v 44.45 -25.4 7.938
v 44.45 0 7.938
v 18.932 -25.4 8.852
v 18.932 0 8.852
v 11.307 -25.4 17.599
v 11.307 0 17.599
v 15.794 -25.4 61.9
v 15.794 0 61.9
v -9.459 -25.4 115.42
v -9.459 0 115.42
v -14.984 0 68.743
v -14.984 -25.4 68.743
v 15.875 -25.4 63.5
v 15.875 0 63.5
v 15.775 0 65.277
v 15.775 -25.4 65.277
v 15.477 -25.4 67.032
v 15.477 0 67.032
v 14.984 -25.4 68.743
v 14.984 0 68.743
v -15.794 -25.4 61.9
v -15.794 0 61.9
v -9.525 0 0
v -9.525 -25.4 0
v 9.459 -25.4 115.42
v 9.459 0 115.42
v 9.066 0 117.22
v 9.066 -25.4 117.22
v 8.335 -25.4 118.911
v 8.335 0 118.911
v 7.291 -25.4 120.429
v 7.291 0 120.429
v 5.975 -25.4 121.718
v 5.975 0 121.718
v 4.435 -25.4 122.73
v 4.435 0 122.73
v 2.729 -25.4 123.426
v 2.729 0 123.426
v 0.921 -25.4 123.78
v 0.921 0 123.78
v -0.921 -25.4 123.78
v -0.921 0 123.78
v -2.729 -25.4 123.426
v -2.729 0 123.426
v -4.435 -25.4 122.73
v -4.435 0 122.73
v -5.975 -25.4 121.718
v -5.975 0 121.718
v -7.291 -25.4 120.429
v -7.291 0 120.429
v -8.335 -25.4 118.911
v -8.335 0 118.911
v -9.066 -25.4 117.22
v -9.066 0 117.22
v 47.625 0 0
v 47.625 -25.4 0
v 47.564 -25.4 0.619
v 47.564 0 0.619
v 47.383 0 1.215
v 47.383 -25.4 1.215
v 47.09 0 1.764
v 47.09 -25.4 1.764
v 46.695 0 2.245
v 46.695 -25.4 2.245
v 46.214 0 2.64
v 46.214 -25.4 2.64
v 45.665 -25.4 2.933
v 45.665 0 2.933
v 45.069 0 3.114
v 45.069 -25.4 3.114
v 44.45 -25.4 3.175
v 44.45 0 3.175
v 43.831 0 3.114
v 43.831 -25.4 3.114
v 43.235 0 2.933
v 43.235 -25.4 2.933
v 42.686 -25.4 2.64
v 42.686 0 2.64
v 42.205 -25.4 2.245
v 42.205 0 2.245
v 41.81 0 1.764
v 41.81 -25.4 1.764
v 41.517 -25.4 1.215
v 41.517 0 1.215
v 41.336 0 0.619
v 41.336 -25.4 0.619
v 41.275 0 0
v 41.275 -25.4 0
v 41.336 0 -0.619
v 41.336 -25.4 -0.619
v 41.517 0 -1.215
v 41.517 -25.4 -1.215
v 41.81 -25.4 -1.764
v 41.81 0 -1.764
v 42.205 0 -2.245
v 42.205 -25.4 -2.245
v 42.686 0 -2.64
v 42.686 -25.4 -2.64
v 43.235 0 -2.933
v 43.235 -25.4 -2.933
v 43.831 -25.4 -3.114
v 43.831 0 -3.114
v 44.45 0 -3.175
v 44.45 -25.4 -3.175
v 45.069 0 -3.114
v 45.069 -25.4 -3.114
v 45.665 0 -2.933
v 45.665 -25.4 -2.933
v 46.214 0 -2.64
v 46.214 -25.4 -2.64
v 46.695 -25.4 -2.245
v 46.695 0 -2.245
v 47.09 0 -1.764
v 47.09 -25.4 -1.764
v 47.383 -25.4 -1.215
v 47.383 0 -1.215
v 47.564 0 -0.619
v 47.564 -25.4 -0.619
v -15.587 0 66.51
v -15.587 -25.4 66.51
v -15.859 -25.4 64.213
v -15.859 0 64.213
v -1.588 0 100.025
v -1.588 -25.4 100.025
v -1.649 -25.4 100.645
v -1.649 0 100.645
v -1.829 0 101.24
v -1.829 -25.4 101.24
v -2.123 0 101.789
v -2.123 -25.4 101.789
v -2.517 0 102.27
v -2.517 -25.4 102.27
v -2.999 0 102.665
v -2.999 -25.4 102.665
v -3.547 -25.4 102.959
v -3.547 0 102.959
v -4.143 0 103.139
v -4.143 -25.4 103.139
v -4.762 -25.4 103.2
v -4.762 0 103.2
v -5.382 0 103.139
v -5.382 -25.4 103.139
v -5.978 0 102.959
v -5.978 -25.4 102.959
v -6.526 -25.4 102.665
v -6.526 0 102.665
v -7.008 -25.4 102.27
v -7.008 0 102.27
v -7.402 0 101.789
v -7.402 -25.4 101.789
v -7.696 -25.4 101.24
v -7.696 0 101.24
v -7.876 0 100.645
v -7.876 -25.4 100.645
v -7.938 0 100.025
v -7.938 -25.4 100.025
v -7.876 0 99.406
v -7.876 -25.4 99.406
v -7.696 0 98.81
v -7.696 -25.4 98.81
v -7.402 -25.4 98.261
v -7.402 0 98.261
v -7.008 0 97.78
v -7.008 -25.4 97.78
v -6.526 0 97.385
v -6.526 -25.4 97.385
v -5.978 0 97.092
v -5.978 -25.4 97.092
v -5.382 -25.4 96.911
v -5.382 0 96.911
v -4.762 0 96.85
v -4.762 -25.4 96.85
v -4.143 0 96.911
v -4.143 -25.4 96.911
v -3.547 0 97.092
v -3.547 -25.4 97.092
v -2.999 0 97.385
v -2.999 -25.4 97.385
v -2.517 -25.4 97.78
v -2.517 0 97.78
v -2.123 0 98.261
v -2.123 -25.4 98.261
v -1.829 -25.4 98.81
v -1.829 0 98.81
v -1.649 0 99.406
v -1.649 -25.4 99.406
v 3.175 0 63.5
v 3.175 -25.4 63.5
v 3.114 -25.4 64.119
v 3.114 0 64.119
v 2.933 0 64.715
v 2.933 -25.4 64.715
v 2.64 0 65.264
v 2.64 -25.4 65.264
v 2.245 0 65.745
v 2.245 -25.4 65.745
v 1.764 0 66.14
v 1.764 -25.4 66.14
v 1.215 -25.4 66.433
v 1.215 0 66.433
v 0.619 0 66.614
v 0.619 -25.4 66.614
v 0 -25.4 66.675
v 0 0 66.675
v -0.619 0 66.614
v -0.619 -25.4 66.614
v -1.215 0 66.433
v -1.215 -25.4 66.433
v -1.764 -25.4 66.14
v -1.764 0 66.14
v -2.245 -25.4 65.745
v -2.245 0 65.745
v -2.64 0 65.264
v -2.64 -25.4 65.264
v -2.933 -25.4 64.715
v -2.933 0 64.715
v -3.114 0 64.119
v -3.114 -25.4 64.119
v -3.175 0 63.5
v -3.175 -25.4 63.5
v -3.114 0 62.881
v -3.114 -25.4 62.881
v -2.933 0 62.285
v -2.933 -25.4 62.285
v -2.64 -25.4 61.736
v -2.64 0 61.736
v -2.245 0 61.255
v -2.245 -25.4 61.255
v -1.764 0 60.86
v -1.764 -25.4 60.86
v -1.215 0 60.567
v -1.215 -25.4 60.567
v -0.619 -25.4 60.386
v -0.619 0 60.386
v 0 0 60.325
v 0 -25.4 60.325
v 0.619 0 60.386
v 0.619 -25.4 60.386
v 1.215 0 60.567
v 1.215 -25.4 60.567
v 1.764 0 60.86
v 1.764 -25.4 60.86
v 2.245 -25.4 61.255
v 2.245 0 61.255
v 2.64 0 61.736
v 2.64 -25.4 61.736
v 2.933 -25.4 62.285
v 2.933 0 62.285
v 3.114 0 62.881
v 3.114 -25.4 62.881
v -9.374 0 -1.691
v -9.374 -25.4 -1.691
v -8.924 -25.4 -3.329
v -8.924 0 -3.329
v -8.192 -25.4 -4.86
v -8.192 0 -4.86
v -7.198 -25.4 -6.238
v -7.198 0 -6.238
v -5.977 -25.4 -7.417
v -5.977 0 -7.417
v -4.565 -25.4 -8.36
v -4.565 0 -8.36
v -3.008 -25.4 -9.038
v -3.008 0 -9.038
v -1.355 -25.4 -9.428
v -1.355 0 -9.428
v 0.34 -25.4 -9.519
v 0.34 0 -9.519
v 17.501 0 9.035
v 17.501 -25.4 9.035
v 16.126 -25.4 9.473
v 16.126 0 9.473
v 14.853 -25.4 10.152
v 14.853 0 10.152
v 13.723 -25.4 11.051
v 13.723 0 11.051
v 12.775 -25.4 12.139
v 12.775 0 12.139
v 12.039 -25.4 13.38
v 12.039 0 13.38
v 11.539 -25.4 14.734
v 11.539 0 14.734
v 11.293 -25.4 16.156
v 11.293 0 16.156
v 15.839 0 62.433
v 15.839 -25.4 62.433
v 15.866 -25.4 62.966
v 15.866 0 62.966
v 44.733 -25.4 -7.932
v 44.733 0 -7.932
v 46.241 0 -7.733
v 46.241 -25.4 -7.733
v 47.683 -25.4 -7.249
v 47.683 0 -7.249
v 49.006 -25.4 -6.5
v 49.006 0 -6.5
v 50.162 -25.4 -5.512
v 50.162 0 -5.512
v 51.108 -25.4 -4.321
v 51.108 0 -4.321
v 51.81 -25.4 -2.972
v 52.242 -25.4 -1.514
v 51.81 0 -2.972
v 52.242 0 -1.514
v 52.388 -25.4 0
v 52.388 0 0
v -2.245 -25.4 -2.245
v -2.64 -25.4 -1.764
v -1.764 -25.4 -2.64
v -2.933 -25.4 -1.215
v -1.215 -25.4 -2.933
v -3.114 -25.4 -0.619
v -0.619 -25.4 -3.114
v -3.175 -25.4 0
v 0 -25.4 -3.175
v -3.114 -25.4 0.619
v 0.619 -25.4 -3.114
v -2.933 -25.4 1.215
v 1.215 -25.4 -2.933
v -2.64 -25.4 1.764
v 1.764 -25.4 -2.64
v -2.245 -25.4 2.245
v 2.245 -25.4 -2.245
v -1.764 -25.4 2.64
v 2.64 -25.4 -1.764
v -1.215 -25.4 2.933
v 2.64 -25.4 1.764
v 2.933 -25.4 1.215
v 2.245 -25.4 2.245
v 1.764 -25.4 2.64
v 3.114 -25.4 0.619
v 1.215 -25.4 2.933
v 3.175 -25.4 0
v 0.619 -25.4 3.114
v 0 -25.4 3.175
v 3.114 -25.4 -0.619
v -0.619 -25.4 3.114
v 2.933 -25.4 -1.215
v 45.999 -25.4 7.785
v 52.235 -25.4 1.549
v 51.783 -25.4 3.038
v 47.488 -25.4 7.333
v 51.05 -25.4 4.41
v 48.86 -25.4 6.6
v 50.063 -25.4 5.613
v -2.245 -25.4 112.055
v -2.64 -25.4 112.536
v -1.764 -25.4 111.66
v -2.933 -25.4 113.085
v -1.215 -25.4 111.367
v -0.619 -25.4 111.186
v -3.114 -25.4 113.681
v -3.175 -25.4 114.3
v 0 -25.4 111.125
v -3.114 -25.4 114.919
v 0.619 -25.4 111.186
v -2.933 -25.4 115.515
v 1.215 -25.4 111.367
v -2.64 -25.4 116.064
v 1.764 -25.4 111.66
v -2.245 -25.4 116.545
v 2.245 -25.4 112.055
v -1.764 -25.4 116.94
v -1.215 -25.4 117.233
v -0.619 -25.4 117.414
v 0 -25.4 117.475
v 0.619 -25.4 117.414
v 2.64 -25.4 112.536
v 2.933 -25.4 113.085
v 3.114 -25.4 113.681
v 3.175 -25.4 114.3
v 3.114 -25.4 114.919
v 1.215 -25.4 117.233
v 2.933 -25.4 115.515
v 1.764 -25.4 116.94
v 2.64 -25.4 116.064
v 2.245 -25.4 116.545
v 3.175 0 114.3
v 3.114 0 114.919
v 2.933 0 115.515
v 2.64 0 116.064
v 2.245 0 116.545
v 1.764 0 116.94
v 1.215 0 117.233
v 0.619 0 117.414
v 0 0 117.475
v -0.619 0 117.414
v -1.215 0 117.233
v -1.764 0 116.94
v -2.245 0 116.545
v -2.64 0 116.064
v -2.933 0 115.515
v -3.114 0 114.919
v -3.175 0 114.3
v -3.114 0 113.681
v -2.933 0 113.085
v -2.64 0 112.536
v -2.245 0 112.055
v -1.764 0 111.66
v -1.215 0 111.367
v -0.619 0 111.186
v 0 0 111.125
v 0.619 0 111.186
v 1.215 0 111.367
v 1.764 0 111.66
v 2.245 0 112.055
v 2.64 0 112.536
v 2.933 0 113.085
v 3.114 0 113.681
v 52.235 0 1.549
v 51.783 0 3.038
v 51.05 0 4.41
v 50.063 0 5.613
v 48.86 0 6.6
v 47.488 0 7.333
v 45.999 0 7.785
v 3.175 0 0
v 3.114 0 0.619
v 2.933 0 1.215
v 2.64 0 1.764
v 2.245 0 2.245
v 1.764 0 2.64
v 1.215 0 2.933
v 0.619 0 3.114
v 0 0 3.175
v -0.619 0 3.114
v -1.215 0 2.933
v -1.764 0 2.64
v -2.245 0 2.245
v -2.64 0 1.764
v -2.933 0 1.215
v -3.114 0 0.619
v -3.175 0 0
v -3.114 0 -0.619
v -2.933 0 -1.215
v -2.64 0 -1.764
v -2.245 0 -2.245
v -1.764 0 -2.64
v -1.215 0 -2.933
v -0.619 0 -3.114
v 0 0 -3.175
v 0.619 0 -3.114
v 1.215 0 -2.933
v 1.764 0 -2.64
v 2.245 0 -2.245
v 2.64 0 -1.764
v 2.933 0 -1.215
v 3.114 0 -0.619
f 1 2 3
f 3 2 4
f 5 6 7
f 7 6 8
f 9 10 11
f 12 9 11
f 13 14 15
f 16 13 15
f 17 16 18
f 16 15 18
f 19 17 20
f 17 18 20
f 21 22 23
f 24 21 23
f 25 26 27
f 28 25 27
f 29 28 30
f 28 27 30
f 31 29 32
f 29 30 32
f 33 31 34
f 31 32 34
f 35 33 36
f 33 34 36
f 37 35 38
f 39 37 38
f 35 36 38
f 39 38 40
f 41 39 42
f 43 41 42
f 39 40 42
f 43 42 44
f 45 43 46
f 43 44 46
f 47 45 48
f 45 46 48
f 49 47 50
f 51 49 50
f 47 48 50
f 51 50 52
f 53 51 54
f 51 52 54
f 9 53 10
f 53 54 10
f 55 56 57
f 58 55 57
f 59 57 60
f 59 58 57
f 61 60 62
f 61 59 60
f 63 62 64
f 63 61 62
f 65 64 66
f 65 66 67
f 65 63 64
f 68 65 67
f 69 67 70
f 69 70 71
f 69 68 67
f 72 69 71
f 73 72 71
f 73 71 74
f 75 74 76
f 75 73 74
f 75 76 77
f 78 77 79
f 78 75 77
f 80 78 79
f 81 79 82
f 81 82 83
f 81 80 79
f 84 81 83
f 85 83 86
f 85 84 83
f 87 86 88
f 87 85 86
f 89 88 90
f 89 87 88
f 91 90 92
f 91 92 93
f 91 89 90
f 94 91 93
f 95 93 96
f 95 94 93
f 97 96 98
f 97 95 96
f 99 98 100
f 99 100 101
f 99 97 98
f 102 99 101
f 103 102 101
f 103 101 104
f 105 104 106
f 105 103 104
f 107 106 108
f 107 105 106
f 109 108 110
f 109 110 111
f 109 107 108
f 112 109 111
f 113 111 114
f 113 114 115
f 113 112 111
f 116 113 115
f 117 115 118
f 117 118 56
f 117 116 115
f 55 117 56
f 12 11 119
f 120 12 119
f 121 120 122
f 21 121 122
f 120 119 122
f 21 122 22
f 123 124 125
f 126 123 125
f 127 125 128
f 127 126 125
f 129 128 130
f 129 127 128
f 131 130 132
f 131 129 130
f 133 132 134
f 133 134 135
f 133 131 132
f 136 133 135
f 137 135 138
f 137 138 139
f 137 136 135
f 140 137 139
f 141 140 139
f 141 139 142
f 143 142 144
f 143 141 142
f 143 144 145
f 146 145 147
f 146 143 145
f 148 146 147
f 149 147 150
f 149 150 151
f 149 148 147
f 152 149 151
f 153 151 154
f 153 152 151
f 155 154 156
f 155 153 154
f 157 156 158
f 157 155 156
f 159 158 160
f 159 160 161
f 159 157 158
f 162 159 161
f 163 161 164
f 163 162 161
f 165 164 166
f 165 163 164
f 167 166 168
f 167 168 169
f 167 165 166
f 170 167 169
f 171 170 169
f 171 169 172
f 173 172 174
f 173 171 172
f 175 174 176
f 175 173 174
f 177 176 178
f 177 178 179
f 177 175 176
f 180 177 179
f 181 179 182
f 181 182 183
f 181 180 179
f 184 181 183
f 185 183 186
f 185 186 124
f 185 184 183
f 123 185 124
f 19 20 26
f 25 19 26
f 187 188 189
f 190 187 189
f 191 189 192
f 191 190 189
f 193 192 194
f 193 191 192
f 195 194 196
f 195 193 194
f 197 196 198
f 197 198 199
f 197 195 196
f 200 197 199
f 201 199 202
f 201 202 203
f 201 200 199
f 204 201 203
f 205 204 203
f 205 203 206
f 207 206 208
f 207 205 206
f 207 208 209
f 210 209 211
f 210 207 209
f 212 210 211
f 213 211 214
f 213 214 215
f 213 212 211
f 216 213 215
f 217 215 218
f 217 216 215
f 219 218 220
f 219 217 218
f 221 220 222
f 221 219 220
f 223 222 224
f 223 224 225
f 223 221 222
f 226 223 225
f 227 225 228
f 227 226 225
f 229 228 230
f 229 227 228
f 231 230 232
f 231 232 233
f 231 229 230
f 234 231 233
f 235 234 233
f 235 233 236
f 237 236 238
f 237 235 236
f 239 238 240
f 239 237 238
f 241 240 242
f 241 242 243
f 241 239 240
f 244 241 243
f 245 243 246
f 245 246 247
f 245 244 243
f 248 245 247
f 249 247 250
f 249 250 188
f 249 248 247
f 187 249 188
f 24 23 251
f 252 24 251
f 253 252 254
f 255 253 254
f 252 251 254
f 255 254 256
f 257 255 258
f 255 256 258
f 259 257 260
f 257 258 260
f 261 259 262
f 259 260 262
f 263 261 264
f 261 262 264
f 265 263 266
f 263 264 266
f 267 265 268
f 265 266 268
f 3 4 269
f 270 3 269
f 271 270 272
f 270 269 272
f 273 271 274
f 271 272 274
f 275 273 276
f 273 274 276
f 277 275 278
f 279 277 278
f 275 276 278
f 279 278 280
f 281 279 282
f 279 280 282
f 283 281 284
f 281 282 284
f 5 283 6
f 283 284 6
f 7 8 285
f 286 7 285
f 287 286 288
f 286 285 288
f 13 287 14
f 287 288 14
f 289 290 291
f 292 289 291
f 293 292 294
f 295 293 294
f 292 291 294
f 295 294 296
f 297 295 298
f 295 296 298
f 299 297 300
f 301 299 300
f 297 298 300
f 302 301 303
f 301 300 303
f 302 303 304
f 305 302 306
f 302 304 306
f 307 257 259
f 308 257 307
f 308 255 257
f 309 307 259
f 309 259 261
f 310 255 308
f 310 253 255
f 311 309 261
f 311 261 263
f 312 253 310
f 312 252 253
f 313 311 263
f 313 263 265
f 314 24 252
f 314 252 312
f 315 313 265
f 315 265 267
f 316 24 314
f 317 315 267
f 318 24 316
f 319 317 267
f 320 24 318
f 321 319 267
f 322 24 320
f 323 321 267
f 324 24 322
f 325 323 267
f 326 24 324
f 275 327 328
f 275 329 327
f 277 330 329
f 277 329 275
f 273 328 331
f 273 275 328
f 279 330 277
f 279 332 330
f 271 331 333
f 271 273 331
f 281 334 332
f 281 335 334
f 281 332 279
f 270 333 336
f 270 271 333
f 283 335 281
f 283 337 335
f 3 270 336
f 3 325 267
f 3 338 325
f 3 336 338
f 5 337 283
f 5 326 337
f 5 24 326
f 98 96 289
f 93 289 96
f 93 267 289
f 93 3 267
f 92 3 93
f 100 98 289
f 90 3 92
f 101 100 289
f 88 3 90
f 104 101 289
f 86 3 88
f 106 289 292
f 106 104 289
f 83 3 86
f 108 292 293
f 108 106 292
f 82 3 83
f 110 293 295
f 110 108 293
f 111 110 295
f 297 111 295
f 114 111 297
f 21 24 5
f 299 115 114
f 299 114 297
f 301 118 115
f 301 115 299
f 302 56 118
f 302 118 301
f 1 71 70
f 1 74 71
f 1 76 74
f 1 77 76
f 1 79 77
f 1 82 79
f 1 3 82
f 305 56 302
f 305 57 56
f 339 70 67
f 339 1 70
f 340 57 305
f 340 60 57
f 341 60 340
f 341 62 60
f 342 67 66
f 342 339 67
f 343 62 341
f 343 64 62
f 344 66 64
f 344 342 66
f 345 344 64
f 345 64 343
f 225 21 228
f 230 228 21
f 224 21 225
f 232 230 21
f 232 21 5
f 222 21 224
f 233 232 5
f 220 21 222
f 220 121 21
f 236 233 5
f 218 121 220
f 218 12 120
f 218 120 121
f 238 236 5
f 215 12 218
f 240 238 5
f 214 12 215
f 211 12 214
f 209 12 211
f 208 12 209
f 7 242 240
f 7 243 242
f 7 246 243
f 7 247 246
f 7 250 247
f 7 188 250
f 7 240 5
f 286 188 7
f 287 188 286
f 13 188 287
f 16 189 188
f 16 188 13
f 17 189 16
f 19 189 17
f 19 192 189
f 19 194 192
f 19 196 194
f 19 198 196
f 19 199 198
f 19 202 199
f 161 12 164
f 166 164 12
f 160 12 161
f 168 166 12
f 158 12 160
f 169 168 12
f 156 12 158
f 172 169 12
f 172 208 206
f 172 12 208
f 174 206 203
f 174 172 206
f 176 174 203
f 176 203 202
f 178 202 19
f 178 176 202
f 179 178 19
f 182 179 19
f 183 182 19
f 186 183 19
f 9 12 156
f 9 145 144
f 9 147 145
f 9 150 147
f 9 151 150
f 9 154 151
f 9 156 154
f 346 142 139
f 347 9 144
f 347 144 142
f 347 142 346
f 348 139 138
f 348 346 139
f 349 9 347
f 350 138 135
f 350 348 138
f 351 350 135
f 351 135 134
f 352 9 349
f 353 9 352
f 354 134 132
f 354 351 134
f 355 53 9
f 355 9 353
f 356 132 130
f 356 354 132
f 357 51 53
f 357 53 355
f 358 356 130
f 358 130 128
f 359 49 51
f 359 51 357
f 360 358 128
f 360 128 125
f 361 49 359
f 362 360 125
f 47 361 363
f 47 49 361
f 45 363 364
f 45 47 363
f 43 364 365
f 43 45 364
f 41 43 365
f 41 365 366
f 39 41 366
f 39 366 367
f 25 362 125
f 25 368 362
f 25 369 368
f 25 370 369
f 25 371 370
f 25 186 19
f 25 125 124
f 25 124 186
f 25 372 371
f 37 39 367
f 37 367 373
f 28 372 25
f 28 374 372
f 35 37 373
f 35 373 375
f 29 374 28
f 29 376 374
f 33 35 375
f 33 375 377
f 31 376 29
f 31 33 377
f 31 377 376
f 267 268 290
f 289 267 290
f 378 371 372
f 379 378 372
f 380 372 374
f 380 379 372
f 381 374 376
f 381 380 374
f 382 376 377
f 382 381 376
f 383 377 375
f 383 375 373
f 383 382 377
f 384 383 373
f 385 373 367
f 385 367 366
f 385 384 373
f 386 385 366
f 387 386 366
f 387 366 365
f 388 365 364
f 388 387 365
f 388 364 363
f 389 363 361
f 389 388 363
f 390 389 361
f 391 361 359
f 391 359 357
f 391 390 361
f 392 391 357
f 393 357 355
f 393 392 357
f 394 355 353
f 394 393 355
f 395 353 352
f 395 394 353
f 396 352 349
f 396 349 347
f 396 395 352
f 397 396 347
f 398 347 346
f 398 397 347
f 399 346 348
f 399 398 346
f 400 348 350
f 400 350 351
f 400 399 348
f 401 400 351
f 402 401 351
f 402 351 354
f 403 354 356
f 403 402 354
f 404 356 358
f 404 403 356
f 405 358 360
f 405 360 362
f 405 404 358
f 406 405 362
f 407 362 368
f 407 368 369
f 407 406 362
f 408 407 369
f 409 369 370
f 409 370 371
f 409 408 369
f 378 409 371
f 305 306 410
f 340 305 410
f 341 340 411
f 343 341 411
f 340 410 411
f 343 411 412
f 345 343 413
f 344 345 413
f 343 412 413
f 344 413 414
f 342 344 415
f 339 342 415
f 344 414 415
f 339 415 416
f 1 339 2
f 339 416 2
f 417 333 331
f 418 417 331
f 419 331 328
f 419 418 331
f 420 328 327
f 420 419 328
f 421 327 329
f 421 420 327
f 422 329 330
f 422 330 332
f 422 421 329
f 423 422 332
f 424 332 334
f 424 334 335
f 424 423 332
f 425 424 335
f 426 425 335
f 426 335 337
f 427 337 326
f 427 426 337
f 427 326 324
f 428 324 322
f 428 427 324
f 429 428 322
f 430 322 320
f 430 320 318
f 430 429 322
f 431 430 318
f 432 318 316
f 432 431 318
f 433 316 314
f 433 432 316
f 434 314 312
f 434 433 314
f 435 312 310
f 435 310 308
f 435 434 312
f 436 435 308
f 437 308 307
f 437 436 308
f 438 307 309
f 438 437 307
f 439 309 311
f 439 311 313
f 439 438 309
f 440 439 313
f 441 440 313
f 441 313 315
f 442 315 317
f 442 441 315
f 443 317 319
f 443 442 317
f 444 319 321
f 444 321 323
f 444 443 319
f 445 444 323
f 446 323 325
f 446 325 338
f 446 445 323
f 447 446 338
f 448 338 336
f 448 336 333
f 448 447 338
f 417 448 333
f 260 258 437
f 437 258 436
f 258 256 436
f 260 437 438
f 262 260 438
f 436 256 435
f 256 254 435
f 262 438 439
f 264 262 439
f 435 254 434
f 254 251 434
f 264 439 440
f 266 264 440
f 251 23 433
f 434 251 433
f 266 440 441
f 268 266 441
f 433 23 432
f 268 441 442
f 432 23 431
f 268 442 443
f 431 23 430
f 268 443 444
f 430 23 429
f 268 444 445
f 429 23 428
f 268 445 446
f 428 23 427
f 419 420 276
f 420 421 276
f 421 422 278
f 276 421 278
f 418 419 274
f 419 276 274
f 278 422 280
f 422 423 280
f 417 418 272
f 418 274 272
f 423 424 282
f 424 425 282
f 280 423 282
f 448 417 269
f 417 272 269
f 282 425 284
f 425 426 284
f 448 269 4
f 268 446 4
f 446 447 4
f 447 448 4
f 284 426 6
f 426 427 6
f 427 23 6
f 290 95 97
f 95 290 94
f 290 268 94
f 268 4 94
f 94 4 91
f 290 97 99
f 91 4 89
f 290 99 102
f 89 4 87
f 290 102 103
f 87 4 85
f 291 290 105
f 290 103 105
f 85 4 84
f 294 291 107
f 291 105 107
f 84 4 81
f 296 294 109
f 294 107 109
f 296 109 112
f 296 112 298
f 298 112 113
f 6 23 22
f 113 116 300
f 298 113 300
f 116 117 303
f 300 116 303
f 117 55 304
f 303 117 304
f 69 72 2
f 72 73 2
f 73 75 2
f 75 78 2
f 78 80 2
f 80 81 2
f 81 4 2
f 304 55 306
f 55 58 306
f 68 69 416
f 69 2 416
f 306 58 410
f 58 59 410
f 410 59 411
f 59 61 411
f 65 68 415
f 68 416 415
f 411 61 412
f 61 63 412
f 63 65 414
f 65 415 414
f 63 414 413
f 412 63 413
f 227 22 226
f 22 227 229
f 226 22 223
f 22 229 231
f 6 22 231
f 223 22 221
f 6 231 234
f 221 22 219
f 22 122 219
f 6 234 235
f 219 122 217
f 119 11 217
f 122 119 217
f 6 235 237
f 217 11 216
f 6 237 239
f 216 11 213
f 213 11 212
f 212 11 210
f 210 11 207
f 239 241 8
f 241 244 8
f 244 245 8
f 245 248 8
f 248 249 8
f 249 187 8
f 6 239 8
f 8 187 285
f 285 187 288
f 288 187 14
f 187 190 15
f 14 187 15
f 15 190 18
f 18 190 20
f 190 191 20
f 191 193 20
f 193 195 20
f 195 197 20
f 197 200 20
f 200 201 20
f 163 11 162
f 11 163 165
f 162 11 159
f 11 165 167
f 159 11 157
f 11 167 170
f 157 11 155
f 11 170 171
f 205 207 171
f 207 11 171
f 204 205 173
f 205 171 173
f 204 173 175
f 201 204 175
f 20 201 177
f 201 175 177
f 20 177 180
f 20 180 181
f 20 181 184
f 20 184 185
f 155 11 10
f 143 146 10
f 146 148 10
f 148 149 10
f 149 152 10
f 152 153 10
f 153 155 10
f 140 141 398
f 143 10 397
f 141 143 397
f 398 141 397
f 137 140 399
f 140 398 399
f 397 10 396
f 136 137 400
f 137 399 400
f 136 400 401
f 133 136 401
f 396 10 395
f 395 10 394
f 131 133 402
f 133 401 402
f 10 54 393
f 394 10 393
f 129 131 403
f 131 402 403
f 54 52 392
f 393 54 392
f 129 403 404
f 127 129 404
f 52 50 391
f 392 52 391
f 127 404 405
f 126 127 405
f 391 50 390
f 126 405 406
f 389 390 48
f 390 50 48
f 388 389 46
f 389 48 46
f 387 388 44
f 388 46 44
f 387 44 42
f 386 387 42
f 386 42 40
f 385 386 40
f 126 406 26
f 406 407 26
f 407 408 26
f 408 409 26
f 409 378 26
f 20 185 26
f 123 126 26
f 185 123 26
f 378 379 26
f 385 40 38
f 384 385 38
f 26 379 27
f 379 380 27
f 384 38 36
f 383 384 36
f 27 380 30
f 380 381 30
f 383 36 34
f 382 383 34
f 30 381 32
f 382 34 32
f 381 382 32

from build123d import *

# Parameters (mm, degrees)
F0_R     = 3.175
F1_DEPTH = 25.4


with BuildPart() as f1:
    # F0 (on Front) → F1 (new body)
    with BuildSketch(Plane.XZ):
        with BuildLine():
            ThreePointArc((44.7334821429, -7.9324362036), (50.1620069047, -5.5115227815), (52.3875, 0))
            ThreePointArc((52.3875, 0), (50.0626600757, 5.6126600757), (44.45, 7.9375))
            ThreePointArc((44.45, 7.9375), (36.5137660501, -0.1417636831), (44.7334821429, -7.9324362036))
        make_face()
        with Locations((44.45, 0)):
            Circle(F0_R, mode=Mode.SUBTRACT)
        with BuildLine():
            ThreePointArc((44.7334821429, -7.9324362036), (36.5137660501, -0.1417636831), (44.45, 7.9375))
            Line((44.45, 7.9375), (18.9322510366, 8.8523612883))
            ThreePointArc((18.9322510366, 8.8523612883), (13.2244578226, 11.5730964697), (11.3073615093, 17.5985462477))
            Line((11.3073615093, 17.5985462477), (15.7942028036, 61.9003804205))
            ThreePointArc((15.7942028036, 61.9003804205), (0, 47.625), (-15.7942028036, 61.9003804205))
            Line((-15.7942028036, 61.9003804205), (-9.525, 0))
            ThreePointArc((-9.525, 0), (0, 9.525), (9.525, 0))
            ThreePointArc((9.525, 0), (6.854408295, -6.6138273281), (0.3401785982, -9.5189234434))
            Line((0.3401785982, -9.5189234434), (44.7334821429, -7.9324362036))
        make_face()
        with BuildLine():
            ThreePointArc((-9.525, 0), (-6.6138273281, -6.854408295), (0.3401785982, -9.5189234434))
            ThreePointArc((0.3401785982, -9.5189234434), (6.854408295, -6.6138273281), (9.525, 0))
            ThreePointArc((9.525, 0), (0, 9.525), (-9.525, 0))
        make_face()
        Circle(F0_R, mode=Mode.SUBTRACT)
        with BuildLine():
            Line((14.9842264132, 68.7429556358), (15.7942028036, 61.9003804205))
            ThreePointArc((15.7942028036, 61.9003804205), (15.8547878338, 62.6991705884), (15.875, 63.5))
            ThreePointArc((15.875, 63.5), (15.6507223365, 66.1590440661), (14.9842264132, 68.7429556358))
        make_face()
        with BuildLine():
            ThreePointArc((-15.7942028036, 61.9003804205), (0, 47.625), (15.7942028036, 61.9003804205))
            Line((15.7942028036, 61.9003804205), (14.9842264132, 68.7429556358))
            ThreePointArc((14.9842264132, 68.7429556358), (0, 79.375), (-14.9842264132, 68.7429556358))
            Line((-14.9842264132, 68.7429556358), (-15.7942028036, 61.9003804205))
        make_face()
        with Locations((0, 63.5)):
            Circle(F0_R, mode=Mode.SUBTRACT)
        with BuildLine():
            ThreePointArc((-14.9842264132, 68.7429556358), (-15.7649337188, 65.3661430393), (-15.7942028036, 61.9003804205))
            Line((-15.7942028036, 61.9003804205), (-14.9842264132, 68.7429556358))
        make_face()
        with BuildLine():
            ThreePointArc((-14.9842264132, 68.7429556358), (0, 79.375), (14.9842264132, 68.7429556358))
            Line((14.9842264132, 68.7429556358), (9.4589602313, 115.4196858236))
            ThreePointArc((9.4589602313, 115.4196858236), (9.5084757244, 114.8608158331), (9.525, 114.3))
            ThreePointArc((9.525, 114.3), (-0.5608158331, 104.7915242756), (-9.4589602313, 115.4196858236))
            Line((-9.4589602313, 115.4196858236), (-14.9842264132, 68.7429556358))
        make_face()
        with Locations((-4.7625, 100.0252)):
            Circle(F0_R, mode=Mode.SUBTRACT)
        with BuildLine():
            ThreePointArc((9.525, 114.3), (9.5084757244, 114.8608158331), (9.4589602313, 115.4196858236))
            ThreePointArc((9.4589602313, 115.4196858236), (0, 123.825), (-9.4589602313, 115.4196858236))
            ThreePointArc((-9.4589602313, 115.4196858236), (-0.5608158331, 104.7915242756), (9.525, 114.3))
        make_face()
        with Locations((0, 114.3)):
            Circle(F0_R, mode=Mode.SUBTRACT)
    extrude(amount=F1_DEPTH)


solid = f1.part
